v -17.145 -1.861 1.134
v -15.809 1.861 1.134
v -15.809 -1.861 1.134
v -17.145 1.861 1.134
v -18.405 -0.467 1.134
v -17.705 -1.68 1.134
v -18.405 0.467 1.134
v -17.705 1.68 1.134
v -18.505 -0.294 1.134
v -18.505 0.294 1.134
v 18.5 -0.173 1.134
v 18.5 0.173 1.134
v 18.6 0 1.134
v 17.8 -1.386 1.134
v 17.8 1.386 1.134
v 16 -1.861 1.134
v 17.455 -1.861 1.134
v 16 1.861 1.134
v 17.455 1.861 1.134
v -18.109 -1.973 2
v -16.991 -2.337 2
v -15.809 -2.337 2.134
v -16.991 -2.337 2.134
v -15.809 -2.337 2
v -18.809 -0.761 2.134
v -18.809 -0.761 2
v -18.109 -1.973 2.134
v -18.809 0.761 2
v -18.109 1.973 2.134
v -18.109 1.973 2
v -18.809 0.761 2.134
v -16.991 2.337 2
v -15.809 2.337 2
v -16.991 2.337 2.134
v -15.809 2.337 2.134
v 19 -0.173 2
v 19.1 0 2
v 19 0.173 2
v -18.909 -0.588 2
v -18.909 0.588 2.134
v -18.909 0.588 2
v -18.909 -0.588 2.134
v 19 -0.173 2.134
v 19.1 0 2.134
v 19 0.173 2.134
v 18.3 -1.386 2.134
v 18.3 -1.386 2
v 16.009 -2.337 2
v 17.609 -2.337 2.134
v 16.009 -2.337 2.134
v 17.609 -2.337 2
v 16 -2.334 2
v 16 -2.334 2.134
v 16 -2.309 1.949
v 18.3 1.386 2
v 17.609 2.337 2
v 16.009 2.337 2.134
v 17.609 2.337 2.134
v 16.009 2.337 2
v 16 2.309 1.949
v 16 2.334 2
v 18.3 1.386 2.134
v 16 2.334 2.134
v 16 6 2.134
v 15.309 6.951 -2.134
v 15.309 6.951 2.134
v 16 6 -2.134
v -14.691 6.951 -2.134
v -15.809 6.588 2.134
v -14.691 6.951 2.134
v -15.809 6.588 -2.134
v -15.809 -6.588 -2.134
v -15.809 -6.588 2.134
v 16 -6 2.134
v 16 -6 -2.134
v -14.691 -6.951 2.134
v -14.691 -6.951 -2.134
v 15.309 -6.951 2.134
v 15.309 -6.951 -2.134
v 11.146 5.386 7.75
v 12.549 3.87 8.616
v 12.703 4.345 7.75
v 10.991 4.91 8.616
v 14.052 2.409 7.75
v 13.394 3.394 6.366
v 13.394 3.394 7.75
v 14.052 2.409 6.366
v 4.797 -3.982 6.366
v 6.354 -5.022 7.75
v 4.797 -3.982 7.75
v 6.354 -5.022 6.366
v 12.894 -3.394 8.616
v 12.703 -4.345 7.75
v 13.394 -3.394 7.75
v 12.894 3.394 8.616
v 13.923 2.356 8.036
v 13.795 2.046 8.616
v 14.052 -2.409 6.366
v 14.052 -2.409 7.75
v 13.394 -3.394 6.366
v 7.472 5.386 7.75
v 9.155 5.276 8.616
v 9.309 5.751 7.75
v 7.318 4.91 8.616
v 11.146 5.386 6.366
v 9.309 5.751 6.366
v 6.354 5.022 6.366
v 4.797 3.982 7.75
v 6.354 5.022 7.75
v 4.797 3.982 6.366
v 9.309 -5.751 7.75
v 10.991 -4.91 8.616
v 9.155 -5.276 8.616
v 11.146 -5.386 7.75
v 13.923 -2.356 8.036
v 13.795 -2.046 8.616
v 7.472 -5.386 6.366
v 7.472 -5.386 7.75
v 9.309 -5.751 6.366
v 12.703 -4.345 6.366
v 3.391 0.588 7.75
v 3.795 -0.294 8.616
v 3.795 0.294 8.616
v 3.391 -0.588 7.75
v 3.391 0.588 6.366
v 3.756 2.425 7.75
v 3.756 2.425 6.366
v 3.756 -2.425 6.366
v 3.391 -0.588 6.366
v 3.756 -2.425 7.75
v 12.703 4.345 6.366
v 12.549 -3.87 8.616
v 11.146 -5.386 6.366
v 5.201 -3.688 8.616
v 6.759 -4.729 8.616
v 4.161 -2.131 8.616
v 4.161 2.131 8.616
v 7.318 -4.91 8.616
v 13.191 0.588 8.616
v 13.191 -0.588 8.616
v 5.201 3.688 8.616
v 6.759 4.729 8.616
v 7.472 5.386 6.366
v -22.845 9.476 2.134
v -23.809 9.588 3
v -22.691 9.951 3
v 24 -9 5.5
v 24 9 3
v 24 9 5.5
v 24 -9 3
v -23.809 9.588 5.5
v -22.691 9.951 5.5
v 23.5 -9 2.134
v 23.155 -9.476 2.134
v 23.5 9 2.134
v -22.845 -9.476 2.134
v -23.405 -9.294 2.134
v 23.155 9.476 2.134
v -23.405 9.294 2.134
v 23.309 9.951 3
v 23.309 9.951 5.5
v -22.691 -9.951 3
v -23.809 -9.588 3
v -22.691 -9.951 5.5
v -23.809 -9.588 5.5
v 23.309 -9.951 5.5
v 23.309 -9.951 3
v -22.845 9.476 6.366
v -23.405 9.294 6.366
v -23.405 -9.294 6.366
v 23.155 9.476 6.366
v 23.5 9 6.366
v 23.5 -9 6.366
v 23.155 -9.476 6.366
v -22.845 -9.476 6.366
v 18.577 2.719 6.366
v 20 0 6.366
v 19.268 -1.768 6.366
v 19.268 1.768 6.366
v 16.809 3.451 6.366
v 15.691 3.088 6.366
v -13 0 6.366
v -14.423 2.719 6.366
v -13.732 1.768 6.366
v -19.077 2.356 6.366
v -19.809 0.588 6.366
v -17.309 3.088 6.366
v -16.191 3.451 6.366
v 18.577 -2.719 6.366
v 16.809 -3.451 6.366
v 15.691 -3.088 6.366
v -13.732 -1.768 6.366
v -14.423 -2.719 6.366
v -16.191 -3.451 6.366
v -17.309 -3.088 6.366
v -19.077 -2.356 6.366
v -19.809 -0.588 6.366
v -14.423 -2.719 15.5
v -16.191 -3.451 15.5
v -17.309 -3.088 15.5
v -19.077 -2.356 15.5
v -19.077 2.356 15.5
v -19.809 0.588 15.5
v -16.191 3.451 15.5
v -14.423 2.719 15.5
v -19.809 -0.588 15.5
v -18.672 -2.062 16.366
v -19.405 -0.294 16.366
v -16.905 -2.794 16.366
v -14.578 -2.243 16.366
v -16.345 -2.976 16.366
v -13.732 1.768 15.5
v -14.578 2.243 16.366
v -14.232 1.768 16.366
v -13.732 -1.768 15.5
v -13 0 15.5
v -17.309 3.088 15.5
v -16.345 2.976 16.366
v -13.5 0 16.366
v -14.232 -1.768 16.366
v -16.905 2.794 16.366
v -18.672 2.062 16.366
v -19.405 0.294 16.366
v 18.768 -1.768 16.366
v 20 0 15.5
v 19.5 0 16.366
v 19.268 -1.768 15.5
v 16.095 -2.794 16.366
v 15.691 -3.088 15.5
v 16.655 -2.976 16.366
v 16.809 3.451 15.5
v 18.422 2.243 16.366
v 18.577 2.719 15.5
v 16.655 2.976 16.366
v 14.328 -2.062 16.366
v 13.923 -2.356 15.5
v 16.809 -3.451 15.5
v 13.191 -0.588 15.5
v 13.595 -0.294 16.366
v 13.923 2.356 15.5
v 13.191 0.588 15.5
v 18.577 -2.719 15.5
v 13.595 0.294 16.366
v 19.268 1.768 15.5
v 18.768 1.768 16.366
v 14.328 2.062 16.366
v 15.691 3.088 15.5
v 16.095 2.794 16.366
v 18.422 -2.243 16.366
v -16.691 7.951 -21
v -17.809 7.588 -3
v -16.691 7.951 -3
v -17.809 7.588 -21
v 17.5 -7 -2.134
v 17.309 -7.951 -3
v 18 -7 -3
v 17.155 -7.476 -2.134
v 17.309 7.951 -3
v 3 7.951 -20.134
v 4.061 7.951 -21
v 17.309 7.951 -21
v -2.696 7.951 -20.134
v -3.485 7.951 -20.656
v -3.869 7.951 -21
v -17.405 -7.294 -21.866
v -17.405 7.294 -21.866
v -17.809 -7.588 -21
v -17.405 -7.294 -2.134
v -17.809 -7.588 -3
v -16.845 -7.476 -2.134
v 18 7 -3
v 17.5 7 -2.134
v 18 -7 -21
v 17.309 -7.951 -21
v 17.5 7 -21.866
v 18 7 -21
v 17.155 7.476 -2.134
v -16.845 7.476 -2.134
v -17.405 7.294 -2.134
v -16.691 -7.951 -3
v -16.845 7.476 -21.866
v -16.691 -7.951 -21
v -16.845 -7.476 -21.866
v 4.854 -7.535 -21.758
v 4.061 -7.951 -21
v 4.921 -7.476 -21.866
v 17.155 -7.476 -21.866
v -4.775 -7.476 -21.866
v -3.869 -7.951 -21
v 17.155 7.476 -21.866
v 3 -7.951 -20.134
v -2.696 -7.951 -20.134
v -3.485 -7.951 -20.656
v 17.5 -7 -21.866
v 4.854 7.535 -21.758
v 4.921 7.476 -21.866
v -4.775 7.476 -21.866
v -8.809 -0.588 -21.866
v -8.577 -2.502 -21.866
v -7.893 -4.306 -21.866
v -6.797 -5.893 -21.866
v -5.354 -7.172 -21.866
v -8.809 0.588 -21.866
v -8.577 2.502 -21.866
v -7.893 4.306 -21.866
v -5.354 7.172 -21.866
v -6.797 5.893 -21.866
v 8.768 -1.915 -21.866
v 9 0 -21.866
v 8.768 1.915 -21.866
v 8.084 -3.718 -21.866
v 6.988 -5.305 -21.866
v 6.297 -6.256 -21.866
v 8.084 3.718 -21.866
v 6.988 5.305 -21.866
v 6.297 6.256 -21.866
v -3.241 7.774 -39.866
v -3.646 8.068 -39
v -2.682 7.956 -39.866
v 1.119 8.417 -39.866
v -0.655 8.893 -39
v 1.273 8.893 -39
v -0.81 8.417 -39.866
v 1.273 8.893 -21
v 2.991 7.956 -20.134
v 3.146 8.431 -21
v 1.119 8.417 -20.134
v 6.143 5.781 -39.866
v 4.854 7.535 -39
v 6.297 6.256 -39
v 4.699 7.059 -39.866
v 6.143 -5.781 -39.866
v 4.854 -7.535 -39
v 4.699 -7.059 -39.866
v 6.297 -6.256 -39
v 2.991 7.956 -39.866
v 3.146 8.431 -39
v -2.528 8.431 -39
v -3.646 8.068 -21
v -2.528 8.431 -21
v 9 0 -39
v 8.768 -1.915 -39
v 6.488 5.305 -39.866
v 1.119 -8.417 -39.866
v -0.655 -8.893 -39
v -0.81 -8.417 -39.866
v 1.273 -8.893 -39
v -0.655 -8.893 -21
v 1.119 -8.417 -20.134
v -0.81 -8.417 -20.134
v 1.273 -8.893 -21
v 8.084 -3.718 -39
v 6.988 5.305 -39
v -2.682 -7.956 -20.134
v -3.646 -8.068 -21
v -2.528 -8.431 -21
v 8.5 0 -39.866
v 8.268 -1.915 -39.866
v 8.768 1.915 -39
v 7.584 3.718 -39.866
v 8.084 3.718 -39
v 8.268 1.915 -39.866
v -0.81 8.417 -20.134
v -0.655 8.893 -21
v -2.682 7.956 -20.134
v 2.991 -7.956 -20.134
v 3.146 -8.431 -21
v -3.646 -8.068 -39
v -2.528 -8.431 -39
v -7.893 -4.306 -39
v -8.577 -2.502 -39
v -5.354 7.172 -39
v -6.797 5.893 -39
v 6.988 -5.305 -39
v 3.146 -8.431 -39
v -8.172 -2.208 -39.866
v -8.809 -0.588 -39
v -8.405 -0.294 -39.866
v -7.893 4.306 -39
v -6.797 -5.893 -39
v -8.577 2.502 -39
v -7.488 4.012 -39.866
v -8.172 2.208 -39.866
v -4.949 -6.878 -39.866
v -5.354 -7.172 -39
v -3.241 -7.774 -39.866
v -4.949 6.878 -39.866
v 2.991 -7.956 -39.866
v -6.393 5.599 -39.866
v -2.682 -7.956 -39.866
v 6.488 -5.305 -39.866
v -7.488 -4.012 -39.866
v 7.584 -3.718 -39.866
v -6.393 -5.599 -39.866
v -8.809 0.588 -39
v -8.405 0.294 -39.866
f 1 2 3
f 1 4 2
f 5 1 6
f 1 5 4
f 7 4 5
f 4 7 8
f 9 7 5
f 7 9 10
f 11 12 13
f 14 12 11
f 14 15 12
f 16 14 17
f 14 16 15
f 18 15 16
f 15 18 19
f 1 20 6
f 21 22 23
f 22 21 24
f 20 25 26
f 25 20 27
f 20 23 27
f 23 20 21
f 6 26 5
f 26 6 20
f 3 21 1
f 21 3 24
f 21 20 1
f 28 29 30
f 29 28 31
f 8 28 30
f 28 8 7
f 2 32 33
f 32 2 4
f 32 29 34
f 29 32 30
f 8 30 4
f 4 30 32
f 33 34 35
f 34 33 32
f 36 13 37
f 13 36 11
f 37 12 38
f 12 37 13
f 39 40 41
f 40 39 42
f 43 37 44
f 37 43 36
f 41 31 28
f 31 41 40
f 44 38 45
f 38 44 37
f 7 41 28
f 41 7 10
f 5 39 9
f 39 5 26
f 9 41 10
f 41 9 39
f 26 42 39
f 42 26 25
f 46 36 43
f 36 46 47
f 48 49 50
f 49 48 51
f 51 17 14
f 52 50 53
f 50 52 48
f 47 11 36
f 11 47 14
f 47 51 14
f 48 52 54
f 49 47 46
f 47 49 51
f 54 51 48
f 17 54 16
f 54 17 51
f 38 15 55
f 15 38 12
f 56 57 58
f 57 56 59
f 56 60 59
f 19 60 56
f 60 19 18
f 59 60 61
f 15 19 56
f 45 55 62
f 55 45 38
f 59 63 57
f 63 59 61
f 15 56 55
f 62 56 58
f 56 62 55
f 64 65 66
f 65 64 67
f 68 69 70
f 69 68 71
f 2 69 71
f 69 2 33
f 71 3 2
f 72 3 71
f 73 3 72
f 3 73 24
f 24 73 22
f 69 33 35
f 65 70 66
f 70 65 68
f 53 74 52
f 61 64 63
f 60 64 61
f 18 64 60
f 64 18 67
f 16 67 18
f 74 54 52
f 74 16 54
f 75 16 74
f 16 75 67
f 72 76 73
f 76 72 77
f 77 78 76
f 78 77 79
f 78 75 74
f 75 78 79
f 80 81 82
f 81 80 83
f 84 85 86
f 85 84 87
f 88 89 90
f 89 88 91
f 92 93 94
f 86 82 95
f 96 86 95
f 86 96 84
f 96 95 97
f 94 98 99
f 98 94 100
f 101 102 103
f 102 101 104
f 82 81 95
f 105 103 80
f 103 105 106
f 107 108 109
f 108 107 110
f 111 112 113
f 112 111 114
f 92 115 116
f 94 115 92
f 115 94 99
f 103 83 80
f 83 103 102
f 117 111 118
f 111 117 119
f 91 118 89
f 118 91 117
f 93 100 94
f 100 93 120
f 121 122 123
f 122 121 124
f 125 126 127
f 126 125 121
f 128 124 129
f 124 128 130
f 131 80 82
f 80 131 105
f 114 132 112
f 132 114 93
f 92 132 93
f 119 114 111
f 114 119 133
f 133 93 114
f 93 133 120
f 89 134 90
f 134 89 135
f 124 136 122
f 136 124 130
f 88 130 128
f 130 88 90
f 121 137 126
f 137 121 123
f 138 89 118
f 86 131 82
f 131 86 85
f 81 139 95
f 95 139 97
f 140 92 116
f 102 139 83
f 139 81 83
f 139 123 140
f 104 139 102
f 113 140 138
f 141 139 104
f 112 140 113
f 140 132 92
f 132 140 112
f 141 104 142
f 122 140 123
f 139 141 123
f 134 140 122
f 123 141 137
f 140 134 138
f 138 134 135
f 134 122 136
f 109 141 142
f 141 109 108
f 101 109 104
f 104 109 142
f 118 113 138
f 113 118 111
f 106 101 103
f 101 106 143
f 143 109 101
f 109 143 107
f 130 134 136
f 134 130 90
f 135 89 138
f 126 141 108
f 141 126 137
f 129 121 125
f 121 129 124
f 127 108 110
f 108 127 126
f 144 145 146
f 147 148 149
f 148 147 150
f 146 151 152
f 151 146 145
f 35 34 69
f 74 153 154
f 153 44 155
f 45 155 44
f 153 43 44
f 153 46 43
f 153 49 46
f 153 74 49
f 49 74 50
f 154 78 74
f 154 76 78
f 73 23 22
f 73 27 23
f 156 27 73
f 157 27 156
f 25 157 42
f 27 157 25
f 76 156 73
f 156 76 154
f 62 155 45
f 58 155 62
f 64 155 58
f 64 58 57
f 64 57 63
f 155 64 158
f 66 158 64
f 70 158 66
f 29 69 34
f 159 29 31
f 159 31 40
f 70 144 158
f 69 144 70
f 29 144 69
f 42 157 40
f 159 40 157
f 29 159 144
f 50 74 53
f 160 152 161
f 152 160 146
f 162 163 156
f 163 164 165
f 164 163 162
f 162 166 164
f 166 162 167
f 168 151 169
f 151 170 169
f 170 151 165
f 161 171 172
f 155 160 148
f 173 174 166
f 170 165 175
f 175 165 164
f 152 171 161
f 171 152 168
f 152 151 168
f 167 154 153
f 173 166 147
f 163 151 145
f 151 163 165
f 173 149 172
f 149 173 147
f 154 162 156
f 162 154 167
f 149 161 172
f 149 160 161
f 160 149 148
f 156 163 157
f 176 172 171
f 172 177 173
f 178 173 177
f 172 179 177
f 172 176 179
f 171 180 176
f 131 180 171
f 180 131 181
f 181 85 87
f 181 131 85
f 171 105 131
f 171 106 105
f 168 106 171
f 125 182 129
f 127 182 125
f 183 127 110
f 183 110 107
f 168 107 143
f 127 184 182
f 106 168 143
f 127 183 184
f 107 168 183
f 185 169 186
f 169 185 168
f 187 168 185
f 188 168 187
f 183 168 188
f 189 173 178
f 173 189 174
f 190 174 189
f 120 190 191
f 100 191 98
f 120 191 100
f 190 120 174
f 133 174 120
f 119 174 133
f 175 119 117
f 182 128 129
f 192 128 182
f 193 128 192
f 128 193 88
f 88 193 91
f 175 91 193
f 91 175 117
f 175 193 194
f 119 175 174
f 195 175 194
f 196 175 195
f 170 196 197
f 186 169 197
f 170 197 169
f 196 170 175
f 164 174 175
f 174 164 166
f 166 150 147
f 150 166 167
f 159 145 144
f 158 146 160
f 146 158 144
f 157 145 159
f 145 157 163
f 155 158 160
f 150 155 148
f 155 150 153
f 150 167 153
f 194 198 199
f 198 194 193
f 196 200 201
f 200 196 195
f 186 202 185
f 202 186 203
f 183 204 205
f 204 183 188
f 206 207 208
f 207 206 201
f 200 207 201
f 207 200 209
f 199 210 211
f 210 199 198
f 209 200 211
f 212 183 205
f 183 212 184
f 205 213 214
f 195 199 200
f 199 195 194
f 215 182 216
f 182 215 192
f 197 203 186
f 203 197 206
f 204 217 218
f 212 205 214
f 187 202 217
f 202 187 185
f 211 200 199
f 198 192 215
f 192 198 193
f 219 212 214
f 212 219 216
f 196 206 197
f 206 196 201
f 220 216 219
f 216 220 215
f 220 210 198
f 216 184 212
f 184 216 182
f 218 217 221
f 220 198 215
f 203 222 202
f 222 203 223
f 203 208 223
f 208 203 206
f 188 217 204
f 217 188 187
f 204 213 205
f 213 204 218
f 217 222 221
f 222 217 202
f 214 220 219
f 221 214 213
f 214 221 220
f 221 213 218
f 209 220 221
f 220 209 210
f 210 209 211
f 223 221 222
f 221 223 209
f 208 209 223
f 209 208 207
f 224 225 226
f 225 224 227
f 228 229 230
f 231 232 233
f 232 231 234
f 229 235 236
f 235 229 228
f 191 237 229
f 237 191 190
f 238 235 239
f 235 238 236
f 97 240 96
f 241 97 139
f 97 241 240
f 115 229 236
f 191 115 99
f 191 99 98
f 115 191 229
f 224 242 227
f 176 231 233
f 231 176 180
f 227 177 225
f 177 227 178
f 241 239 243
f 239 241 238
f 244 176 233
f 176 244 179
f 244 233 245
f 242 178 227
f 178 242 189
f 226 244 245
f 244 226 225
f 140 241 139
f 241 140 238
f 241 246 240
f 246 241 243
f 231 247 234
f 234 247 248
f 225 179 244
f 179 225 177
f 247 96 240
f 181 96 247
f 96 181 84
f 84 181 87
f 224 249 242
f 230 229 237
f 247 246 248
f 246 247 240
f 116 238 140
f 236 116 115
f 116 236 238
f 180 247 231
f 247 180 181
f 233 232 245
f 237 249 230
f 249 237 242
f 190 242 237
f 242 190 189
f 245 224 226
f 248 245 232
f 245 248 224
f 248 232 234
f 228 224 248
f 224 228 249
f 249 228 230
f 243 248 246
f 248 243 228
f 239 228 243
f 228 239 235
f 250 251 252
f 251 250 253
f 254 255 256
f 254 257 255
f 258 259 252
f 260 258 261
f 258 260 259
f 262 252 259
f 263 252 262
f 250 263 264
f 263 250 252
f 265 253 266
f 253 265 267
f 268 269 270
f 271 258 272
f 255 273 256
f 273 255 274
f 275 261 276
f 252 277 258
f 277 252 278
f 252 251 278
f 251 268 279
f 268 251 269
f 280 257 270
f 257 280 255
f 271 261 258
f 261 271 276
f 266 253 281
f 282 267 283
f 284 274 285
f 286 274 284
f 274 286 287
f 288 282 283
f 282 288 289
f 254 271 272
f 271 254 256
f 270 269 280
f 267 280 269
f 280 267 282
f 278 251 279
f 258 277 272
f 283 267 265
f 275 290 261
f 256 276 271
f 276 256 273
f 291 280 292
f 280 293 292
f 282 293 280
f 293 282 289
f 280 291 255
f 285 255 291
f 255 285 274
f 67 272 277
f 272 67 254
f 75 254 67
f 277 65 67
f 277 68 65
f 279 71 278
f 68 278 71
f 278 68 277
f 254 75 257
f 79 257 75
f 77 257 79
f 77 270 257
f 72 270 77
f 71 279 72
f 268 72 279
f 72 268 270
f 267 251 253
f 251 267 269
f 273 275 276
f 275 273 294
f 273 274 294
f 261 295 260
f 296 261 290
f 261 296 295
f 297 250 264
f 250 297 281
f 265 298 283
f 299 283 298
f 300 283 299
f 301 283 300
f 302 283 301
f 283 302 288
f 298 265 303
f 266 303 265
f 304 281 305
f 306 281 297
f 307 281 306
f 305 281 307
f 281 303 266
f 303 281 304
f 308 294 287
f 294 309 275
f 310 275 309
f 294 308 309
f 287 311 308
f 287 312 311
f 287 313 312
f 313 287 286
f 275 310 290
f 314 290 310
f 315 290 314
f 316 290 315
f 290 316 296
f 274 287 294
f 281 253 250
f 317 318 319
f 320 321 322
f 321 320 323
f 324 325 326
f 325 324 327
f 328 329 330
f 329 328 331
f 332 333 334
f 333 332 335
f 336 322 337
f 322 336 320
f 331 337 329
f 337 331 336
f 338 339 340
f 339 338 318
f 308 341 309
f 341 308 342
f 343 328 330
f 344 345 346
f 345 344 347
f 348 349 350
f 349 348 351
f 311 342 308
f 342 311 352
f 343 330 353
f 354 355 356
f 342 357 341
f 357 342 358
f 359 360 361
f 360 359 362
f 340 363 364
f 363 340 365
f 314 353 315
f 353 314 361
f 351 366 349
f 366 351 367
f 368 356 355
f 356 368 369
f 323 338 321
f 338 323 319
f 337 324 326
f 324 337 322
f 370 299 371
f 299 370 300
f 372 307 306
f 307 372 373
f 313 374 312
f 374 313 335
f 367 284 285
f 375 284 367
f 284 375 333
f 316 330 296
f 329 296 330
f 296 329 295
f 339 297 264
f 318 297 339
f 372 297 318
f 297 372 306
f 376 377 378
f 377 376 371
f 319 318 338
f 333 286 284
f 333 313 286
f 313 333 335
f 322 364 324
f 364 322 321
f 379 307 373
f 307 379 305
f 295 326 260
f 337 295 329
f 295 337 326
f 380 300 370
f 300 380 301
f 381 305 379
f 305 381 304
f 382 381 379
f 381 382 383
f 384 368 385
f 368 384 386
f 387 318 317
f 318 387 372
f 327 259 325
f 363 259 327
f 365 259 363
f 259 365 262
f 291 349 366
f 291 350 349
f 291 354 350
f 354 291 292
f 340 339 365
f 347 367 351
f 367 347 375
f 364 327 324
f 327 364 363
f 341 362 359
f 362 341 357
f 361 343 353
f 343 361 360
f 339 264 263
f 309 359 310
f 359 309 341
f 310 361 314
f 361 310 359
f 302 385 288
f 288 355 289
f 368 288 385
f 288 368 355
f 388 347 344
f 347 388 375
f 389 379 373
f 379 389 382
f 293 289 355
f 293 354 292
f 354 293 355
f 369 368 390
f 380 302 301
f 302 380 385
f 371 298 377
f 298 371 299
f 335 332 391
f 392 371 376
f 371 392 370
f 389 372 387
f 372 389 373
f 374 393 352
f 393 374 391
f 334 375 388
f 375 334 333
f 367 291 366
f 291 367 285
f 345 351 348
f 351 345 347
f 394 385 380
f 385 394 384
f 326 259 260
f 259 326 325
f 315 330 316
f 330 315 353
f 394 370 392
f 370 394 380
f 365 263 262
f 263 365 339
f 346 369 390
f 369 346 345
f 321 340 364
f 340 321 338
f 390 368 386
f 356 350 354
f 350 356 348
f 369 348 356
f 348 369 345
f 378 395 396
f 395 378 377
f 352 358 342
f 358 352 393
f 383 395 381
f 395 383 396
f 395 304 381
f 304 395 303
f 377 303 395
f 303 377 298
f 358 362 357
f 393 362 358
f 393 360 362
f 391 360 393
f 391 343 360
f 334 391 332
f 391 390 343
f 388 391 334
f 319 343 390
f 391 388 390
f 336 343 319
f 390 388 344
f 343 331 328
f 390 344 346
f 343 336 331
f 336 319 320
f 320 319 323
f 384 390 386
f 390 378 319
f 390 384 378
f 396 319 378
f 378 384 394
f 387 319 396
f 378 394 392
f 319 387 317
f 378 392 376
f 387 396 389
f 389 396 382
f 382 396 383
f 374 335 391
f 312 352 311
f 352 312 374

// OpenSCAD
// Parameters
overlap = 1; //[0.5:2:0.1]
shell_W = 30; //[15:60:0.5]
shell_H = 12; //[6:24:0.5]
shell_D = 8; //[4:16:0.5]
shell_wall_t = 1.2; //[0.6:2.4:0.1]
body_W = 34; //[17:68:0.5]
body_H = 14; //[7:28:0.5]
body_D = 18; //[9:36:0.5]
flange_W = 46; //[23:92:0.5]
flange_H = 18; //[9:36:0.5]
flange_t = 2.5; //[1.2:5:0.1]
mount_hole_d = 3.2; //[1.6:6.4:0.1]
mount_hole_spacing = 33; //[16.5:66:0.5]
face_recess_D = 1.5; //[0.5:4:0.1]
pin_rows = 2; //[1:3:1]
pin_cols = 9; //[1:25:1]
pin_pitch_x = 2.77; //[1.5:5:0.01]
pin_pitch_y = 2.84; //[1.5:5:0.01]
pin_d = 1; //[0.5:2:0.05]
pin_plate_t = 1.5; //[0.8:3:0.1]
jackscrew_d = 5; //[3:8:0.1]
jackscrew_len = 10; //[5:20:0.5]
strain_relief_W = 20; //[10:40:0.5]
strain_relief_H = 10; //[5:20:0.5]
strain_relief_D = 6; //[3:12:0.5]
boot_r = 8; //[4:16:0.5]
boot_len = 18; //[9:36:0.5]
fillet_r = 1; //[0.5:3:0.1]

// D-shell outer profile
module d_shell_outer_profile() {
  linear_extrude(height = shell_D, center = true)
    polygon(points = [
      [-shell_W/2, -shell_H/2],
      [shell_W/2, -shell_H/2],
      [shell_W/2, shell_H/2],
      [-shell_W/2, shell_H/2],
      [-shell_W/2, -shell_H/2]
    ]);
}

// D-shell outer rounder
module d_shell_outer_rounder() {
  translate([shell_W/2 - shell_H/2, 0, 0])
    cylinder(r = shell_H/2, h = shell_D, center = true);
}

// D-shell inner profile
module d_shell_inner_profile() {
  linear_extrude(height = shell_D - shell_wall_t, center = true)
    polygon(points = [
      [-(shell_W - 2*shell_wall_t)/2, -(shell_H - 2*shell_wall_t)/2],
      [(shell_W - 2*shell_wall_t)/2, -(shell_H - 2*shell_wall_t)/2],
      [(shell_W - 2*shell_wall_t)/2, (shell_H - 2*shell_wall_t)/2],
      [-(shell_W - 2*shell_wall_t)/2, (shell_H - 2*shell_wall_t)/2],
      [-(shell_W - 2*shell_wall_t)/2, -(shell_H - 2*shell_wall_t)/2]
    ]);
}

// D-shell inner rounder
module d_shell_inner_rounder() {
  translate([(shell_W - 2*shell_wall_t)/2 - (shell_H - 2*shell_wall_t)/2, 0, 0])
    cylinder(r = (shell_H - 2*shell_wall_t)/2, h = shell_D - shell_wall_t, center = true);
}

// Connector body
module connector_body() {
  translate([0, 0, -(shell_D/2 + body_D/2 - overlap)])
    cube([body_W, body_H, body_D], center = true);
}

// Mounting flange
module mounting_flange() {
  translate([0, 0, shell_D/2 + flange_t/2 - overlap])
    cube([flange_W, flange_H, flange_t], center = true);
}

// Mounting holes
module mount_hole_left() {
  translate([-mount_hole_spacing/2, 0, shell_D/2 + flange_t/2 - overlap])
    cylinder(r = mount_hole_d/2, h = flange_t + 2*overlap, center = true);
}

module mount_hole_right() {
  translate([mount_hole_spacing/2, 0, shell_D/2 + flange_t/2 - overlap])
    cylinder(r = mount_hole_d/2, h = flange_t + 2*overlap, center = true);
}

// Mating face recess profile
module mating_face_recess_profile() {
  linear_extrude(height = face_recess_D + overlap, center = true)
    polygon(points = [
      [-(shell_W - 2*shell_wall_t)/2, -(shell_H - 2*shell_wall_t)/2],
      [(shell_W - 2*shell_wall_t)/2, -(shell_H - 2*shell_wall_t)/2],
      [(shell_W - 2*shell_wall_t)/2, (shell_H - 2*shell_wall_t)/2],
      [-(shell_W - 2*shell_wall_t)/2, (shell_H - 2*shell_wall_t)/2],
      [-(shell_W - 2*shell_wall_t)/2, -(shell_H - 2*shell_wall_t)/2]
    ]);
}

// Mating face recess rounder
module mating_face_recess_rounder() {
  translate([(shell_W - 2*shell_wall_t)/2 - (shell_H - 2*shell_wall_t)/2, 0, shell_D/2 - face_recess_D/2])
    cylinder(r = (shell_H - 2*shell_wall_t)/2, h = face_recess_D + overlap, center = true);
}

// Pin field placeholder
module pin_field_placeholder() {
  translate([0, 0, shell_D/2 - face_recess_D - pin_plate_t/2 + overlap])
    cube([(pin_cols - 1)*pin_pitch_x + 2*pin_d, (pin_rows - 1)*pin_pitch_y + 2*pin_d, pin_plate_t], center = true);
}

// Pin detail geometry
module pin_detail_geometry() {
  translate([0, 0, shell_D/2 - face_recess_D - pin_plate_t/2 + overlap])
    cylinder(r = pin_d/2, h = pin_plate_t + overlap, center = true);
}

// Jackscrews
module jackscrew_left() {
  translate([-mount_hole_spacing/2, 0, shell_D/2 + flange_t + jackscrew_len/2 - overlap])
    cylinder(r = jackscrew_d/2, h = jackscrew_len, center = true);
}

module jackscrew_right() {
  translate([mount_hole_spacing/2, 0, shell_D/2 + flange_t + jackscrew_len/2 - overlap])
    cylinder(r = jackscrew_d/2, h = jackscrew_len, center = true);
}

// Strain relief
module strain_relief() {
  translate([0, 0, -(shell_D/2 + body_D - strain_relief_D/2 - overlap)])
    cube([strain_relief_W, strain_relief_H, strain_relief_D], center = true);
}

// Rear cable boot
module rear_cable_boot() {
  translate([0, 0, -(shell_D/2 + body_D + boot_len/2 - overlap)])
    cylinder(r = boot_r, h = boot_len, center = true);
}

// Shell fillet chamfers sphere
module shell_fillet_chamfers_sphere() {
  sphere(r = fillet_r, center = true);
}

// Assemble the connector
module connector() {
  // D-shell outer
  union() {
    d_shell_outer_profile();
    d_shell_outer_rounder();
  }
  
  // D-shell inner
  translate([0, 0, -shell_wall_t/2])
    union() {
      d_shell_inner_profile();
      d_shell_inner_rounder();
    }
  
  // D-shell hollow
  difference() {
    union() {
      d_shell_outer_profile();
      d_shell_outer_rounder();
    }
    translate([0, 0, -shell_wall_t/2])
      union() {
        d_shell_inner_profile();
        d_shell_inner_rounder();
      }
  }
  
  // Mating face recess
  translate([0, 0, shell_D/2 - face_recess_D/2])
    union() {
      mating_face_recess_profile();
      mating_face_recess_rounder();
    }
  
  // D-shell with recess
  difference() {
    difference() {
      union() {
        d_shell_outer_profile();
        d_shell_outer_rounder();
      }
      translate([0, 0, -shell_wall_t/2])
        union() {
          d_shell_inner_profile();
          d_shell_inner_rounder();
        }
    }
    translate([0, 0, shell_D/2 - face_recess_D/2])
      union() {
        mating_face_recess_profile();
        mating_face_recess_rounder();
      }
  }
  
  // Mounting holes
  union() {
    mount_hole_left();
    mount_hole_right();
  }
  
  // Flange with holes
  difference() {
    mounting_flange();
    union() {
      mount_hole_left();
      mount_hole_right();
    }
  }
  
  // Jackscrews
  union() {
    jackscrew_left();
    jackscrew_right();
  }
  
  // Connector core union
  union() {
    difference() {
      difference() {
        union() {
          d_shell_outer_profile();
          d_shell_outer_rounder();
        }
        translate([0, 0, -shell_wall_t/2])
          union() {
            d_shell_inner_profile();
            d_shell_inner_rounder();
          }
      }
      translate([0, 0, shell_D/2 - face_recess_D/2])
        union() {
          mating_face_recess_profile();
          mating_face_recess_rounder();
        }
    }
    connector_body();
    difference() {
      mounting_flange();
      union() {
        mount_hole_left();
        mount_hole_right();
      }
    }
    pin_field_placeholder();
    pin_detail_geometry();
    union() {
      jackscrew_left();
      jackscrew_right();
    }
    strain_relief();
    rear_cable_boot();
  }
}

// Final output with fillet chamfers
minkowski() {
  connector();
  shell_fillet_chamfers_sphere();
}
